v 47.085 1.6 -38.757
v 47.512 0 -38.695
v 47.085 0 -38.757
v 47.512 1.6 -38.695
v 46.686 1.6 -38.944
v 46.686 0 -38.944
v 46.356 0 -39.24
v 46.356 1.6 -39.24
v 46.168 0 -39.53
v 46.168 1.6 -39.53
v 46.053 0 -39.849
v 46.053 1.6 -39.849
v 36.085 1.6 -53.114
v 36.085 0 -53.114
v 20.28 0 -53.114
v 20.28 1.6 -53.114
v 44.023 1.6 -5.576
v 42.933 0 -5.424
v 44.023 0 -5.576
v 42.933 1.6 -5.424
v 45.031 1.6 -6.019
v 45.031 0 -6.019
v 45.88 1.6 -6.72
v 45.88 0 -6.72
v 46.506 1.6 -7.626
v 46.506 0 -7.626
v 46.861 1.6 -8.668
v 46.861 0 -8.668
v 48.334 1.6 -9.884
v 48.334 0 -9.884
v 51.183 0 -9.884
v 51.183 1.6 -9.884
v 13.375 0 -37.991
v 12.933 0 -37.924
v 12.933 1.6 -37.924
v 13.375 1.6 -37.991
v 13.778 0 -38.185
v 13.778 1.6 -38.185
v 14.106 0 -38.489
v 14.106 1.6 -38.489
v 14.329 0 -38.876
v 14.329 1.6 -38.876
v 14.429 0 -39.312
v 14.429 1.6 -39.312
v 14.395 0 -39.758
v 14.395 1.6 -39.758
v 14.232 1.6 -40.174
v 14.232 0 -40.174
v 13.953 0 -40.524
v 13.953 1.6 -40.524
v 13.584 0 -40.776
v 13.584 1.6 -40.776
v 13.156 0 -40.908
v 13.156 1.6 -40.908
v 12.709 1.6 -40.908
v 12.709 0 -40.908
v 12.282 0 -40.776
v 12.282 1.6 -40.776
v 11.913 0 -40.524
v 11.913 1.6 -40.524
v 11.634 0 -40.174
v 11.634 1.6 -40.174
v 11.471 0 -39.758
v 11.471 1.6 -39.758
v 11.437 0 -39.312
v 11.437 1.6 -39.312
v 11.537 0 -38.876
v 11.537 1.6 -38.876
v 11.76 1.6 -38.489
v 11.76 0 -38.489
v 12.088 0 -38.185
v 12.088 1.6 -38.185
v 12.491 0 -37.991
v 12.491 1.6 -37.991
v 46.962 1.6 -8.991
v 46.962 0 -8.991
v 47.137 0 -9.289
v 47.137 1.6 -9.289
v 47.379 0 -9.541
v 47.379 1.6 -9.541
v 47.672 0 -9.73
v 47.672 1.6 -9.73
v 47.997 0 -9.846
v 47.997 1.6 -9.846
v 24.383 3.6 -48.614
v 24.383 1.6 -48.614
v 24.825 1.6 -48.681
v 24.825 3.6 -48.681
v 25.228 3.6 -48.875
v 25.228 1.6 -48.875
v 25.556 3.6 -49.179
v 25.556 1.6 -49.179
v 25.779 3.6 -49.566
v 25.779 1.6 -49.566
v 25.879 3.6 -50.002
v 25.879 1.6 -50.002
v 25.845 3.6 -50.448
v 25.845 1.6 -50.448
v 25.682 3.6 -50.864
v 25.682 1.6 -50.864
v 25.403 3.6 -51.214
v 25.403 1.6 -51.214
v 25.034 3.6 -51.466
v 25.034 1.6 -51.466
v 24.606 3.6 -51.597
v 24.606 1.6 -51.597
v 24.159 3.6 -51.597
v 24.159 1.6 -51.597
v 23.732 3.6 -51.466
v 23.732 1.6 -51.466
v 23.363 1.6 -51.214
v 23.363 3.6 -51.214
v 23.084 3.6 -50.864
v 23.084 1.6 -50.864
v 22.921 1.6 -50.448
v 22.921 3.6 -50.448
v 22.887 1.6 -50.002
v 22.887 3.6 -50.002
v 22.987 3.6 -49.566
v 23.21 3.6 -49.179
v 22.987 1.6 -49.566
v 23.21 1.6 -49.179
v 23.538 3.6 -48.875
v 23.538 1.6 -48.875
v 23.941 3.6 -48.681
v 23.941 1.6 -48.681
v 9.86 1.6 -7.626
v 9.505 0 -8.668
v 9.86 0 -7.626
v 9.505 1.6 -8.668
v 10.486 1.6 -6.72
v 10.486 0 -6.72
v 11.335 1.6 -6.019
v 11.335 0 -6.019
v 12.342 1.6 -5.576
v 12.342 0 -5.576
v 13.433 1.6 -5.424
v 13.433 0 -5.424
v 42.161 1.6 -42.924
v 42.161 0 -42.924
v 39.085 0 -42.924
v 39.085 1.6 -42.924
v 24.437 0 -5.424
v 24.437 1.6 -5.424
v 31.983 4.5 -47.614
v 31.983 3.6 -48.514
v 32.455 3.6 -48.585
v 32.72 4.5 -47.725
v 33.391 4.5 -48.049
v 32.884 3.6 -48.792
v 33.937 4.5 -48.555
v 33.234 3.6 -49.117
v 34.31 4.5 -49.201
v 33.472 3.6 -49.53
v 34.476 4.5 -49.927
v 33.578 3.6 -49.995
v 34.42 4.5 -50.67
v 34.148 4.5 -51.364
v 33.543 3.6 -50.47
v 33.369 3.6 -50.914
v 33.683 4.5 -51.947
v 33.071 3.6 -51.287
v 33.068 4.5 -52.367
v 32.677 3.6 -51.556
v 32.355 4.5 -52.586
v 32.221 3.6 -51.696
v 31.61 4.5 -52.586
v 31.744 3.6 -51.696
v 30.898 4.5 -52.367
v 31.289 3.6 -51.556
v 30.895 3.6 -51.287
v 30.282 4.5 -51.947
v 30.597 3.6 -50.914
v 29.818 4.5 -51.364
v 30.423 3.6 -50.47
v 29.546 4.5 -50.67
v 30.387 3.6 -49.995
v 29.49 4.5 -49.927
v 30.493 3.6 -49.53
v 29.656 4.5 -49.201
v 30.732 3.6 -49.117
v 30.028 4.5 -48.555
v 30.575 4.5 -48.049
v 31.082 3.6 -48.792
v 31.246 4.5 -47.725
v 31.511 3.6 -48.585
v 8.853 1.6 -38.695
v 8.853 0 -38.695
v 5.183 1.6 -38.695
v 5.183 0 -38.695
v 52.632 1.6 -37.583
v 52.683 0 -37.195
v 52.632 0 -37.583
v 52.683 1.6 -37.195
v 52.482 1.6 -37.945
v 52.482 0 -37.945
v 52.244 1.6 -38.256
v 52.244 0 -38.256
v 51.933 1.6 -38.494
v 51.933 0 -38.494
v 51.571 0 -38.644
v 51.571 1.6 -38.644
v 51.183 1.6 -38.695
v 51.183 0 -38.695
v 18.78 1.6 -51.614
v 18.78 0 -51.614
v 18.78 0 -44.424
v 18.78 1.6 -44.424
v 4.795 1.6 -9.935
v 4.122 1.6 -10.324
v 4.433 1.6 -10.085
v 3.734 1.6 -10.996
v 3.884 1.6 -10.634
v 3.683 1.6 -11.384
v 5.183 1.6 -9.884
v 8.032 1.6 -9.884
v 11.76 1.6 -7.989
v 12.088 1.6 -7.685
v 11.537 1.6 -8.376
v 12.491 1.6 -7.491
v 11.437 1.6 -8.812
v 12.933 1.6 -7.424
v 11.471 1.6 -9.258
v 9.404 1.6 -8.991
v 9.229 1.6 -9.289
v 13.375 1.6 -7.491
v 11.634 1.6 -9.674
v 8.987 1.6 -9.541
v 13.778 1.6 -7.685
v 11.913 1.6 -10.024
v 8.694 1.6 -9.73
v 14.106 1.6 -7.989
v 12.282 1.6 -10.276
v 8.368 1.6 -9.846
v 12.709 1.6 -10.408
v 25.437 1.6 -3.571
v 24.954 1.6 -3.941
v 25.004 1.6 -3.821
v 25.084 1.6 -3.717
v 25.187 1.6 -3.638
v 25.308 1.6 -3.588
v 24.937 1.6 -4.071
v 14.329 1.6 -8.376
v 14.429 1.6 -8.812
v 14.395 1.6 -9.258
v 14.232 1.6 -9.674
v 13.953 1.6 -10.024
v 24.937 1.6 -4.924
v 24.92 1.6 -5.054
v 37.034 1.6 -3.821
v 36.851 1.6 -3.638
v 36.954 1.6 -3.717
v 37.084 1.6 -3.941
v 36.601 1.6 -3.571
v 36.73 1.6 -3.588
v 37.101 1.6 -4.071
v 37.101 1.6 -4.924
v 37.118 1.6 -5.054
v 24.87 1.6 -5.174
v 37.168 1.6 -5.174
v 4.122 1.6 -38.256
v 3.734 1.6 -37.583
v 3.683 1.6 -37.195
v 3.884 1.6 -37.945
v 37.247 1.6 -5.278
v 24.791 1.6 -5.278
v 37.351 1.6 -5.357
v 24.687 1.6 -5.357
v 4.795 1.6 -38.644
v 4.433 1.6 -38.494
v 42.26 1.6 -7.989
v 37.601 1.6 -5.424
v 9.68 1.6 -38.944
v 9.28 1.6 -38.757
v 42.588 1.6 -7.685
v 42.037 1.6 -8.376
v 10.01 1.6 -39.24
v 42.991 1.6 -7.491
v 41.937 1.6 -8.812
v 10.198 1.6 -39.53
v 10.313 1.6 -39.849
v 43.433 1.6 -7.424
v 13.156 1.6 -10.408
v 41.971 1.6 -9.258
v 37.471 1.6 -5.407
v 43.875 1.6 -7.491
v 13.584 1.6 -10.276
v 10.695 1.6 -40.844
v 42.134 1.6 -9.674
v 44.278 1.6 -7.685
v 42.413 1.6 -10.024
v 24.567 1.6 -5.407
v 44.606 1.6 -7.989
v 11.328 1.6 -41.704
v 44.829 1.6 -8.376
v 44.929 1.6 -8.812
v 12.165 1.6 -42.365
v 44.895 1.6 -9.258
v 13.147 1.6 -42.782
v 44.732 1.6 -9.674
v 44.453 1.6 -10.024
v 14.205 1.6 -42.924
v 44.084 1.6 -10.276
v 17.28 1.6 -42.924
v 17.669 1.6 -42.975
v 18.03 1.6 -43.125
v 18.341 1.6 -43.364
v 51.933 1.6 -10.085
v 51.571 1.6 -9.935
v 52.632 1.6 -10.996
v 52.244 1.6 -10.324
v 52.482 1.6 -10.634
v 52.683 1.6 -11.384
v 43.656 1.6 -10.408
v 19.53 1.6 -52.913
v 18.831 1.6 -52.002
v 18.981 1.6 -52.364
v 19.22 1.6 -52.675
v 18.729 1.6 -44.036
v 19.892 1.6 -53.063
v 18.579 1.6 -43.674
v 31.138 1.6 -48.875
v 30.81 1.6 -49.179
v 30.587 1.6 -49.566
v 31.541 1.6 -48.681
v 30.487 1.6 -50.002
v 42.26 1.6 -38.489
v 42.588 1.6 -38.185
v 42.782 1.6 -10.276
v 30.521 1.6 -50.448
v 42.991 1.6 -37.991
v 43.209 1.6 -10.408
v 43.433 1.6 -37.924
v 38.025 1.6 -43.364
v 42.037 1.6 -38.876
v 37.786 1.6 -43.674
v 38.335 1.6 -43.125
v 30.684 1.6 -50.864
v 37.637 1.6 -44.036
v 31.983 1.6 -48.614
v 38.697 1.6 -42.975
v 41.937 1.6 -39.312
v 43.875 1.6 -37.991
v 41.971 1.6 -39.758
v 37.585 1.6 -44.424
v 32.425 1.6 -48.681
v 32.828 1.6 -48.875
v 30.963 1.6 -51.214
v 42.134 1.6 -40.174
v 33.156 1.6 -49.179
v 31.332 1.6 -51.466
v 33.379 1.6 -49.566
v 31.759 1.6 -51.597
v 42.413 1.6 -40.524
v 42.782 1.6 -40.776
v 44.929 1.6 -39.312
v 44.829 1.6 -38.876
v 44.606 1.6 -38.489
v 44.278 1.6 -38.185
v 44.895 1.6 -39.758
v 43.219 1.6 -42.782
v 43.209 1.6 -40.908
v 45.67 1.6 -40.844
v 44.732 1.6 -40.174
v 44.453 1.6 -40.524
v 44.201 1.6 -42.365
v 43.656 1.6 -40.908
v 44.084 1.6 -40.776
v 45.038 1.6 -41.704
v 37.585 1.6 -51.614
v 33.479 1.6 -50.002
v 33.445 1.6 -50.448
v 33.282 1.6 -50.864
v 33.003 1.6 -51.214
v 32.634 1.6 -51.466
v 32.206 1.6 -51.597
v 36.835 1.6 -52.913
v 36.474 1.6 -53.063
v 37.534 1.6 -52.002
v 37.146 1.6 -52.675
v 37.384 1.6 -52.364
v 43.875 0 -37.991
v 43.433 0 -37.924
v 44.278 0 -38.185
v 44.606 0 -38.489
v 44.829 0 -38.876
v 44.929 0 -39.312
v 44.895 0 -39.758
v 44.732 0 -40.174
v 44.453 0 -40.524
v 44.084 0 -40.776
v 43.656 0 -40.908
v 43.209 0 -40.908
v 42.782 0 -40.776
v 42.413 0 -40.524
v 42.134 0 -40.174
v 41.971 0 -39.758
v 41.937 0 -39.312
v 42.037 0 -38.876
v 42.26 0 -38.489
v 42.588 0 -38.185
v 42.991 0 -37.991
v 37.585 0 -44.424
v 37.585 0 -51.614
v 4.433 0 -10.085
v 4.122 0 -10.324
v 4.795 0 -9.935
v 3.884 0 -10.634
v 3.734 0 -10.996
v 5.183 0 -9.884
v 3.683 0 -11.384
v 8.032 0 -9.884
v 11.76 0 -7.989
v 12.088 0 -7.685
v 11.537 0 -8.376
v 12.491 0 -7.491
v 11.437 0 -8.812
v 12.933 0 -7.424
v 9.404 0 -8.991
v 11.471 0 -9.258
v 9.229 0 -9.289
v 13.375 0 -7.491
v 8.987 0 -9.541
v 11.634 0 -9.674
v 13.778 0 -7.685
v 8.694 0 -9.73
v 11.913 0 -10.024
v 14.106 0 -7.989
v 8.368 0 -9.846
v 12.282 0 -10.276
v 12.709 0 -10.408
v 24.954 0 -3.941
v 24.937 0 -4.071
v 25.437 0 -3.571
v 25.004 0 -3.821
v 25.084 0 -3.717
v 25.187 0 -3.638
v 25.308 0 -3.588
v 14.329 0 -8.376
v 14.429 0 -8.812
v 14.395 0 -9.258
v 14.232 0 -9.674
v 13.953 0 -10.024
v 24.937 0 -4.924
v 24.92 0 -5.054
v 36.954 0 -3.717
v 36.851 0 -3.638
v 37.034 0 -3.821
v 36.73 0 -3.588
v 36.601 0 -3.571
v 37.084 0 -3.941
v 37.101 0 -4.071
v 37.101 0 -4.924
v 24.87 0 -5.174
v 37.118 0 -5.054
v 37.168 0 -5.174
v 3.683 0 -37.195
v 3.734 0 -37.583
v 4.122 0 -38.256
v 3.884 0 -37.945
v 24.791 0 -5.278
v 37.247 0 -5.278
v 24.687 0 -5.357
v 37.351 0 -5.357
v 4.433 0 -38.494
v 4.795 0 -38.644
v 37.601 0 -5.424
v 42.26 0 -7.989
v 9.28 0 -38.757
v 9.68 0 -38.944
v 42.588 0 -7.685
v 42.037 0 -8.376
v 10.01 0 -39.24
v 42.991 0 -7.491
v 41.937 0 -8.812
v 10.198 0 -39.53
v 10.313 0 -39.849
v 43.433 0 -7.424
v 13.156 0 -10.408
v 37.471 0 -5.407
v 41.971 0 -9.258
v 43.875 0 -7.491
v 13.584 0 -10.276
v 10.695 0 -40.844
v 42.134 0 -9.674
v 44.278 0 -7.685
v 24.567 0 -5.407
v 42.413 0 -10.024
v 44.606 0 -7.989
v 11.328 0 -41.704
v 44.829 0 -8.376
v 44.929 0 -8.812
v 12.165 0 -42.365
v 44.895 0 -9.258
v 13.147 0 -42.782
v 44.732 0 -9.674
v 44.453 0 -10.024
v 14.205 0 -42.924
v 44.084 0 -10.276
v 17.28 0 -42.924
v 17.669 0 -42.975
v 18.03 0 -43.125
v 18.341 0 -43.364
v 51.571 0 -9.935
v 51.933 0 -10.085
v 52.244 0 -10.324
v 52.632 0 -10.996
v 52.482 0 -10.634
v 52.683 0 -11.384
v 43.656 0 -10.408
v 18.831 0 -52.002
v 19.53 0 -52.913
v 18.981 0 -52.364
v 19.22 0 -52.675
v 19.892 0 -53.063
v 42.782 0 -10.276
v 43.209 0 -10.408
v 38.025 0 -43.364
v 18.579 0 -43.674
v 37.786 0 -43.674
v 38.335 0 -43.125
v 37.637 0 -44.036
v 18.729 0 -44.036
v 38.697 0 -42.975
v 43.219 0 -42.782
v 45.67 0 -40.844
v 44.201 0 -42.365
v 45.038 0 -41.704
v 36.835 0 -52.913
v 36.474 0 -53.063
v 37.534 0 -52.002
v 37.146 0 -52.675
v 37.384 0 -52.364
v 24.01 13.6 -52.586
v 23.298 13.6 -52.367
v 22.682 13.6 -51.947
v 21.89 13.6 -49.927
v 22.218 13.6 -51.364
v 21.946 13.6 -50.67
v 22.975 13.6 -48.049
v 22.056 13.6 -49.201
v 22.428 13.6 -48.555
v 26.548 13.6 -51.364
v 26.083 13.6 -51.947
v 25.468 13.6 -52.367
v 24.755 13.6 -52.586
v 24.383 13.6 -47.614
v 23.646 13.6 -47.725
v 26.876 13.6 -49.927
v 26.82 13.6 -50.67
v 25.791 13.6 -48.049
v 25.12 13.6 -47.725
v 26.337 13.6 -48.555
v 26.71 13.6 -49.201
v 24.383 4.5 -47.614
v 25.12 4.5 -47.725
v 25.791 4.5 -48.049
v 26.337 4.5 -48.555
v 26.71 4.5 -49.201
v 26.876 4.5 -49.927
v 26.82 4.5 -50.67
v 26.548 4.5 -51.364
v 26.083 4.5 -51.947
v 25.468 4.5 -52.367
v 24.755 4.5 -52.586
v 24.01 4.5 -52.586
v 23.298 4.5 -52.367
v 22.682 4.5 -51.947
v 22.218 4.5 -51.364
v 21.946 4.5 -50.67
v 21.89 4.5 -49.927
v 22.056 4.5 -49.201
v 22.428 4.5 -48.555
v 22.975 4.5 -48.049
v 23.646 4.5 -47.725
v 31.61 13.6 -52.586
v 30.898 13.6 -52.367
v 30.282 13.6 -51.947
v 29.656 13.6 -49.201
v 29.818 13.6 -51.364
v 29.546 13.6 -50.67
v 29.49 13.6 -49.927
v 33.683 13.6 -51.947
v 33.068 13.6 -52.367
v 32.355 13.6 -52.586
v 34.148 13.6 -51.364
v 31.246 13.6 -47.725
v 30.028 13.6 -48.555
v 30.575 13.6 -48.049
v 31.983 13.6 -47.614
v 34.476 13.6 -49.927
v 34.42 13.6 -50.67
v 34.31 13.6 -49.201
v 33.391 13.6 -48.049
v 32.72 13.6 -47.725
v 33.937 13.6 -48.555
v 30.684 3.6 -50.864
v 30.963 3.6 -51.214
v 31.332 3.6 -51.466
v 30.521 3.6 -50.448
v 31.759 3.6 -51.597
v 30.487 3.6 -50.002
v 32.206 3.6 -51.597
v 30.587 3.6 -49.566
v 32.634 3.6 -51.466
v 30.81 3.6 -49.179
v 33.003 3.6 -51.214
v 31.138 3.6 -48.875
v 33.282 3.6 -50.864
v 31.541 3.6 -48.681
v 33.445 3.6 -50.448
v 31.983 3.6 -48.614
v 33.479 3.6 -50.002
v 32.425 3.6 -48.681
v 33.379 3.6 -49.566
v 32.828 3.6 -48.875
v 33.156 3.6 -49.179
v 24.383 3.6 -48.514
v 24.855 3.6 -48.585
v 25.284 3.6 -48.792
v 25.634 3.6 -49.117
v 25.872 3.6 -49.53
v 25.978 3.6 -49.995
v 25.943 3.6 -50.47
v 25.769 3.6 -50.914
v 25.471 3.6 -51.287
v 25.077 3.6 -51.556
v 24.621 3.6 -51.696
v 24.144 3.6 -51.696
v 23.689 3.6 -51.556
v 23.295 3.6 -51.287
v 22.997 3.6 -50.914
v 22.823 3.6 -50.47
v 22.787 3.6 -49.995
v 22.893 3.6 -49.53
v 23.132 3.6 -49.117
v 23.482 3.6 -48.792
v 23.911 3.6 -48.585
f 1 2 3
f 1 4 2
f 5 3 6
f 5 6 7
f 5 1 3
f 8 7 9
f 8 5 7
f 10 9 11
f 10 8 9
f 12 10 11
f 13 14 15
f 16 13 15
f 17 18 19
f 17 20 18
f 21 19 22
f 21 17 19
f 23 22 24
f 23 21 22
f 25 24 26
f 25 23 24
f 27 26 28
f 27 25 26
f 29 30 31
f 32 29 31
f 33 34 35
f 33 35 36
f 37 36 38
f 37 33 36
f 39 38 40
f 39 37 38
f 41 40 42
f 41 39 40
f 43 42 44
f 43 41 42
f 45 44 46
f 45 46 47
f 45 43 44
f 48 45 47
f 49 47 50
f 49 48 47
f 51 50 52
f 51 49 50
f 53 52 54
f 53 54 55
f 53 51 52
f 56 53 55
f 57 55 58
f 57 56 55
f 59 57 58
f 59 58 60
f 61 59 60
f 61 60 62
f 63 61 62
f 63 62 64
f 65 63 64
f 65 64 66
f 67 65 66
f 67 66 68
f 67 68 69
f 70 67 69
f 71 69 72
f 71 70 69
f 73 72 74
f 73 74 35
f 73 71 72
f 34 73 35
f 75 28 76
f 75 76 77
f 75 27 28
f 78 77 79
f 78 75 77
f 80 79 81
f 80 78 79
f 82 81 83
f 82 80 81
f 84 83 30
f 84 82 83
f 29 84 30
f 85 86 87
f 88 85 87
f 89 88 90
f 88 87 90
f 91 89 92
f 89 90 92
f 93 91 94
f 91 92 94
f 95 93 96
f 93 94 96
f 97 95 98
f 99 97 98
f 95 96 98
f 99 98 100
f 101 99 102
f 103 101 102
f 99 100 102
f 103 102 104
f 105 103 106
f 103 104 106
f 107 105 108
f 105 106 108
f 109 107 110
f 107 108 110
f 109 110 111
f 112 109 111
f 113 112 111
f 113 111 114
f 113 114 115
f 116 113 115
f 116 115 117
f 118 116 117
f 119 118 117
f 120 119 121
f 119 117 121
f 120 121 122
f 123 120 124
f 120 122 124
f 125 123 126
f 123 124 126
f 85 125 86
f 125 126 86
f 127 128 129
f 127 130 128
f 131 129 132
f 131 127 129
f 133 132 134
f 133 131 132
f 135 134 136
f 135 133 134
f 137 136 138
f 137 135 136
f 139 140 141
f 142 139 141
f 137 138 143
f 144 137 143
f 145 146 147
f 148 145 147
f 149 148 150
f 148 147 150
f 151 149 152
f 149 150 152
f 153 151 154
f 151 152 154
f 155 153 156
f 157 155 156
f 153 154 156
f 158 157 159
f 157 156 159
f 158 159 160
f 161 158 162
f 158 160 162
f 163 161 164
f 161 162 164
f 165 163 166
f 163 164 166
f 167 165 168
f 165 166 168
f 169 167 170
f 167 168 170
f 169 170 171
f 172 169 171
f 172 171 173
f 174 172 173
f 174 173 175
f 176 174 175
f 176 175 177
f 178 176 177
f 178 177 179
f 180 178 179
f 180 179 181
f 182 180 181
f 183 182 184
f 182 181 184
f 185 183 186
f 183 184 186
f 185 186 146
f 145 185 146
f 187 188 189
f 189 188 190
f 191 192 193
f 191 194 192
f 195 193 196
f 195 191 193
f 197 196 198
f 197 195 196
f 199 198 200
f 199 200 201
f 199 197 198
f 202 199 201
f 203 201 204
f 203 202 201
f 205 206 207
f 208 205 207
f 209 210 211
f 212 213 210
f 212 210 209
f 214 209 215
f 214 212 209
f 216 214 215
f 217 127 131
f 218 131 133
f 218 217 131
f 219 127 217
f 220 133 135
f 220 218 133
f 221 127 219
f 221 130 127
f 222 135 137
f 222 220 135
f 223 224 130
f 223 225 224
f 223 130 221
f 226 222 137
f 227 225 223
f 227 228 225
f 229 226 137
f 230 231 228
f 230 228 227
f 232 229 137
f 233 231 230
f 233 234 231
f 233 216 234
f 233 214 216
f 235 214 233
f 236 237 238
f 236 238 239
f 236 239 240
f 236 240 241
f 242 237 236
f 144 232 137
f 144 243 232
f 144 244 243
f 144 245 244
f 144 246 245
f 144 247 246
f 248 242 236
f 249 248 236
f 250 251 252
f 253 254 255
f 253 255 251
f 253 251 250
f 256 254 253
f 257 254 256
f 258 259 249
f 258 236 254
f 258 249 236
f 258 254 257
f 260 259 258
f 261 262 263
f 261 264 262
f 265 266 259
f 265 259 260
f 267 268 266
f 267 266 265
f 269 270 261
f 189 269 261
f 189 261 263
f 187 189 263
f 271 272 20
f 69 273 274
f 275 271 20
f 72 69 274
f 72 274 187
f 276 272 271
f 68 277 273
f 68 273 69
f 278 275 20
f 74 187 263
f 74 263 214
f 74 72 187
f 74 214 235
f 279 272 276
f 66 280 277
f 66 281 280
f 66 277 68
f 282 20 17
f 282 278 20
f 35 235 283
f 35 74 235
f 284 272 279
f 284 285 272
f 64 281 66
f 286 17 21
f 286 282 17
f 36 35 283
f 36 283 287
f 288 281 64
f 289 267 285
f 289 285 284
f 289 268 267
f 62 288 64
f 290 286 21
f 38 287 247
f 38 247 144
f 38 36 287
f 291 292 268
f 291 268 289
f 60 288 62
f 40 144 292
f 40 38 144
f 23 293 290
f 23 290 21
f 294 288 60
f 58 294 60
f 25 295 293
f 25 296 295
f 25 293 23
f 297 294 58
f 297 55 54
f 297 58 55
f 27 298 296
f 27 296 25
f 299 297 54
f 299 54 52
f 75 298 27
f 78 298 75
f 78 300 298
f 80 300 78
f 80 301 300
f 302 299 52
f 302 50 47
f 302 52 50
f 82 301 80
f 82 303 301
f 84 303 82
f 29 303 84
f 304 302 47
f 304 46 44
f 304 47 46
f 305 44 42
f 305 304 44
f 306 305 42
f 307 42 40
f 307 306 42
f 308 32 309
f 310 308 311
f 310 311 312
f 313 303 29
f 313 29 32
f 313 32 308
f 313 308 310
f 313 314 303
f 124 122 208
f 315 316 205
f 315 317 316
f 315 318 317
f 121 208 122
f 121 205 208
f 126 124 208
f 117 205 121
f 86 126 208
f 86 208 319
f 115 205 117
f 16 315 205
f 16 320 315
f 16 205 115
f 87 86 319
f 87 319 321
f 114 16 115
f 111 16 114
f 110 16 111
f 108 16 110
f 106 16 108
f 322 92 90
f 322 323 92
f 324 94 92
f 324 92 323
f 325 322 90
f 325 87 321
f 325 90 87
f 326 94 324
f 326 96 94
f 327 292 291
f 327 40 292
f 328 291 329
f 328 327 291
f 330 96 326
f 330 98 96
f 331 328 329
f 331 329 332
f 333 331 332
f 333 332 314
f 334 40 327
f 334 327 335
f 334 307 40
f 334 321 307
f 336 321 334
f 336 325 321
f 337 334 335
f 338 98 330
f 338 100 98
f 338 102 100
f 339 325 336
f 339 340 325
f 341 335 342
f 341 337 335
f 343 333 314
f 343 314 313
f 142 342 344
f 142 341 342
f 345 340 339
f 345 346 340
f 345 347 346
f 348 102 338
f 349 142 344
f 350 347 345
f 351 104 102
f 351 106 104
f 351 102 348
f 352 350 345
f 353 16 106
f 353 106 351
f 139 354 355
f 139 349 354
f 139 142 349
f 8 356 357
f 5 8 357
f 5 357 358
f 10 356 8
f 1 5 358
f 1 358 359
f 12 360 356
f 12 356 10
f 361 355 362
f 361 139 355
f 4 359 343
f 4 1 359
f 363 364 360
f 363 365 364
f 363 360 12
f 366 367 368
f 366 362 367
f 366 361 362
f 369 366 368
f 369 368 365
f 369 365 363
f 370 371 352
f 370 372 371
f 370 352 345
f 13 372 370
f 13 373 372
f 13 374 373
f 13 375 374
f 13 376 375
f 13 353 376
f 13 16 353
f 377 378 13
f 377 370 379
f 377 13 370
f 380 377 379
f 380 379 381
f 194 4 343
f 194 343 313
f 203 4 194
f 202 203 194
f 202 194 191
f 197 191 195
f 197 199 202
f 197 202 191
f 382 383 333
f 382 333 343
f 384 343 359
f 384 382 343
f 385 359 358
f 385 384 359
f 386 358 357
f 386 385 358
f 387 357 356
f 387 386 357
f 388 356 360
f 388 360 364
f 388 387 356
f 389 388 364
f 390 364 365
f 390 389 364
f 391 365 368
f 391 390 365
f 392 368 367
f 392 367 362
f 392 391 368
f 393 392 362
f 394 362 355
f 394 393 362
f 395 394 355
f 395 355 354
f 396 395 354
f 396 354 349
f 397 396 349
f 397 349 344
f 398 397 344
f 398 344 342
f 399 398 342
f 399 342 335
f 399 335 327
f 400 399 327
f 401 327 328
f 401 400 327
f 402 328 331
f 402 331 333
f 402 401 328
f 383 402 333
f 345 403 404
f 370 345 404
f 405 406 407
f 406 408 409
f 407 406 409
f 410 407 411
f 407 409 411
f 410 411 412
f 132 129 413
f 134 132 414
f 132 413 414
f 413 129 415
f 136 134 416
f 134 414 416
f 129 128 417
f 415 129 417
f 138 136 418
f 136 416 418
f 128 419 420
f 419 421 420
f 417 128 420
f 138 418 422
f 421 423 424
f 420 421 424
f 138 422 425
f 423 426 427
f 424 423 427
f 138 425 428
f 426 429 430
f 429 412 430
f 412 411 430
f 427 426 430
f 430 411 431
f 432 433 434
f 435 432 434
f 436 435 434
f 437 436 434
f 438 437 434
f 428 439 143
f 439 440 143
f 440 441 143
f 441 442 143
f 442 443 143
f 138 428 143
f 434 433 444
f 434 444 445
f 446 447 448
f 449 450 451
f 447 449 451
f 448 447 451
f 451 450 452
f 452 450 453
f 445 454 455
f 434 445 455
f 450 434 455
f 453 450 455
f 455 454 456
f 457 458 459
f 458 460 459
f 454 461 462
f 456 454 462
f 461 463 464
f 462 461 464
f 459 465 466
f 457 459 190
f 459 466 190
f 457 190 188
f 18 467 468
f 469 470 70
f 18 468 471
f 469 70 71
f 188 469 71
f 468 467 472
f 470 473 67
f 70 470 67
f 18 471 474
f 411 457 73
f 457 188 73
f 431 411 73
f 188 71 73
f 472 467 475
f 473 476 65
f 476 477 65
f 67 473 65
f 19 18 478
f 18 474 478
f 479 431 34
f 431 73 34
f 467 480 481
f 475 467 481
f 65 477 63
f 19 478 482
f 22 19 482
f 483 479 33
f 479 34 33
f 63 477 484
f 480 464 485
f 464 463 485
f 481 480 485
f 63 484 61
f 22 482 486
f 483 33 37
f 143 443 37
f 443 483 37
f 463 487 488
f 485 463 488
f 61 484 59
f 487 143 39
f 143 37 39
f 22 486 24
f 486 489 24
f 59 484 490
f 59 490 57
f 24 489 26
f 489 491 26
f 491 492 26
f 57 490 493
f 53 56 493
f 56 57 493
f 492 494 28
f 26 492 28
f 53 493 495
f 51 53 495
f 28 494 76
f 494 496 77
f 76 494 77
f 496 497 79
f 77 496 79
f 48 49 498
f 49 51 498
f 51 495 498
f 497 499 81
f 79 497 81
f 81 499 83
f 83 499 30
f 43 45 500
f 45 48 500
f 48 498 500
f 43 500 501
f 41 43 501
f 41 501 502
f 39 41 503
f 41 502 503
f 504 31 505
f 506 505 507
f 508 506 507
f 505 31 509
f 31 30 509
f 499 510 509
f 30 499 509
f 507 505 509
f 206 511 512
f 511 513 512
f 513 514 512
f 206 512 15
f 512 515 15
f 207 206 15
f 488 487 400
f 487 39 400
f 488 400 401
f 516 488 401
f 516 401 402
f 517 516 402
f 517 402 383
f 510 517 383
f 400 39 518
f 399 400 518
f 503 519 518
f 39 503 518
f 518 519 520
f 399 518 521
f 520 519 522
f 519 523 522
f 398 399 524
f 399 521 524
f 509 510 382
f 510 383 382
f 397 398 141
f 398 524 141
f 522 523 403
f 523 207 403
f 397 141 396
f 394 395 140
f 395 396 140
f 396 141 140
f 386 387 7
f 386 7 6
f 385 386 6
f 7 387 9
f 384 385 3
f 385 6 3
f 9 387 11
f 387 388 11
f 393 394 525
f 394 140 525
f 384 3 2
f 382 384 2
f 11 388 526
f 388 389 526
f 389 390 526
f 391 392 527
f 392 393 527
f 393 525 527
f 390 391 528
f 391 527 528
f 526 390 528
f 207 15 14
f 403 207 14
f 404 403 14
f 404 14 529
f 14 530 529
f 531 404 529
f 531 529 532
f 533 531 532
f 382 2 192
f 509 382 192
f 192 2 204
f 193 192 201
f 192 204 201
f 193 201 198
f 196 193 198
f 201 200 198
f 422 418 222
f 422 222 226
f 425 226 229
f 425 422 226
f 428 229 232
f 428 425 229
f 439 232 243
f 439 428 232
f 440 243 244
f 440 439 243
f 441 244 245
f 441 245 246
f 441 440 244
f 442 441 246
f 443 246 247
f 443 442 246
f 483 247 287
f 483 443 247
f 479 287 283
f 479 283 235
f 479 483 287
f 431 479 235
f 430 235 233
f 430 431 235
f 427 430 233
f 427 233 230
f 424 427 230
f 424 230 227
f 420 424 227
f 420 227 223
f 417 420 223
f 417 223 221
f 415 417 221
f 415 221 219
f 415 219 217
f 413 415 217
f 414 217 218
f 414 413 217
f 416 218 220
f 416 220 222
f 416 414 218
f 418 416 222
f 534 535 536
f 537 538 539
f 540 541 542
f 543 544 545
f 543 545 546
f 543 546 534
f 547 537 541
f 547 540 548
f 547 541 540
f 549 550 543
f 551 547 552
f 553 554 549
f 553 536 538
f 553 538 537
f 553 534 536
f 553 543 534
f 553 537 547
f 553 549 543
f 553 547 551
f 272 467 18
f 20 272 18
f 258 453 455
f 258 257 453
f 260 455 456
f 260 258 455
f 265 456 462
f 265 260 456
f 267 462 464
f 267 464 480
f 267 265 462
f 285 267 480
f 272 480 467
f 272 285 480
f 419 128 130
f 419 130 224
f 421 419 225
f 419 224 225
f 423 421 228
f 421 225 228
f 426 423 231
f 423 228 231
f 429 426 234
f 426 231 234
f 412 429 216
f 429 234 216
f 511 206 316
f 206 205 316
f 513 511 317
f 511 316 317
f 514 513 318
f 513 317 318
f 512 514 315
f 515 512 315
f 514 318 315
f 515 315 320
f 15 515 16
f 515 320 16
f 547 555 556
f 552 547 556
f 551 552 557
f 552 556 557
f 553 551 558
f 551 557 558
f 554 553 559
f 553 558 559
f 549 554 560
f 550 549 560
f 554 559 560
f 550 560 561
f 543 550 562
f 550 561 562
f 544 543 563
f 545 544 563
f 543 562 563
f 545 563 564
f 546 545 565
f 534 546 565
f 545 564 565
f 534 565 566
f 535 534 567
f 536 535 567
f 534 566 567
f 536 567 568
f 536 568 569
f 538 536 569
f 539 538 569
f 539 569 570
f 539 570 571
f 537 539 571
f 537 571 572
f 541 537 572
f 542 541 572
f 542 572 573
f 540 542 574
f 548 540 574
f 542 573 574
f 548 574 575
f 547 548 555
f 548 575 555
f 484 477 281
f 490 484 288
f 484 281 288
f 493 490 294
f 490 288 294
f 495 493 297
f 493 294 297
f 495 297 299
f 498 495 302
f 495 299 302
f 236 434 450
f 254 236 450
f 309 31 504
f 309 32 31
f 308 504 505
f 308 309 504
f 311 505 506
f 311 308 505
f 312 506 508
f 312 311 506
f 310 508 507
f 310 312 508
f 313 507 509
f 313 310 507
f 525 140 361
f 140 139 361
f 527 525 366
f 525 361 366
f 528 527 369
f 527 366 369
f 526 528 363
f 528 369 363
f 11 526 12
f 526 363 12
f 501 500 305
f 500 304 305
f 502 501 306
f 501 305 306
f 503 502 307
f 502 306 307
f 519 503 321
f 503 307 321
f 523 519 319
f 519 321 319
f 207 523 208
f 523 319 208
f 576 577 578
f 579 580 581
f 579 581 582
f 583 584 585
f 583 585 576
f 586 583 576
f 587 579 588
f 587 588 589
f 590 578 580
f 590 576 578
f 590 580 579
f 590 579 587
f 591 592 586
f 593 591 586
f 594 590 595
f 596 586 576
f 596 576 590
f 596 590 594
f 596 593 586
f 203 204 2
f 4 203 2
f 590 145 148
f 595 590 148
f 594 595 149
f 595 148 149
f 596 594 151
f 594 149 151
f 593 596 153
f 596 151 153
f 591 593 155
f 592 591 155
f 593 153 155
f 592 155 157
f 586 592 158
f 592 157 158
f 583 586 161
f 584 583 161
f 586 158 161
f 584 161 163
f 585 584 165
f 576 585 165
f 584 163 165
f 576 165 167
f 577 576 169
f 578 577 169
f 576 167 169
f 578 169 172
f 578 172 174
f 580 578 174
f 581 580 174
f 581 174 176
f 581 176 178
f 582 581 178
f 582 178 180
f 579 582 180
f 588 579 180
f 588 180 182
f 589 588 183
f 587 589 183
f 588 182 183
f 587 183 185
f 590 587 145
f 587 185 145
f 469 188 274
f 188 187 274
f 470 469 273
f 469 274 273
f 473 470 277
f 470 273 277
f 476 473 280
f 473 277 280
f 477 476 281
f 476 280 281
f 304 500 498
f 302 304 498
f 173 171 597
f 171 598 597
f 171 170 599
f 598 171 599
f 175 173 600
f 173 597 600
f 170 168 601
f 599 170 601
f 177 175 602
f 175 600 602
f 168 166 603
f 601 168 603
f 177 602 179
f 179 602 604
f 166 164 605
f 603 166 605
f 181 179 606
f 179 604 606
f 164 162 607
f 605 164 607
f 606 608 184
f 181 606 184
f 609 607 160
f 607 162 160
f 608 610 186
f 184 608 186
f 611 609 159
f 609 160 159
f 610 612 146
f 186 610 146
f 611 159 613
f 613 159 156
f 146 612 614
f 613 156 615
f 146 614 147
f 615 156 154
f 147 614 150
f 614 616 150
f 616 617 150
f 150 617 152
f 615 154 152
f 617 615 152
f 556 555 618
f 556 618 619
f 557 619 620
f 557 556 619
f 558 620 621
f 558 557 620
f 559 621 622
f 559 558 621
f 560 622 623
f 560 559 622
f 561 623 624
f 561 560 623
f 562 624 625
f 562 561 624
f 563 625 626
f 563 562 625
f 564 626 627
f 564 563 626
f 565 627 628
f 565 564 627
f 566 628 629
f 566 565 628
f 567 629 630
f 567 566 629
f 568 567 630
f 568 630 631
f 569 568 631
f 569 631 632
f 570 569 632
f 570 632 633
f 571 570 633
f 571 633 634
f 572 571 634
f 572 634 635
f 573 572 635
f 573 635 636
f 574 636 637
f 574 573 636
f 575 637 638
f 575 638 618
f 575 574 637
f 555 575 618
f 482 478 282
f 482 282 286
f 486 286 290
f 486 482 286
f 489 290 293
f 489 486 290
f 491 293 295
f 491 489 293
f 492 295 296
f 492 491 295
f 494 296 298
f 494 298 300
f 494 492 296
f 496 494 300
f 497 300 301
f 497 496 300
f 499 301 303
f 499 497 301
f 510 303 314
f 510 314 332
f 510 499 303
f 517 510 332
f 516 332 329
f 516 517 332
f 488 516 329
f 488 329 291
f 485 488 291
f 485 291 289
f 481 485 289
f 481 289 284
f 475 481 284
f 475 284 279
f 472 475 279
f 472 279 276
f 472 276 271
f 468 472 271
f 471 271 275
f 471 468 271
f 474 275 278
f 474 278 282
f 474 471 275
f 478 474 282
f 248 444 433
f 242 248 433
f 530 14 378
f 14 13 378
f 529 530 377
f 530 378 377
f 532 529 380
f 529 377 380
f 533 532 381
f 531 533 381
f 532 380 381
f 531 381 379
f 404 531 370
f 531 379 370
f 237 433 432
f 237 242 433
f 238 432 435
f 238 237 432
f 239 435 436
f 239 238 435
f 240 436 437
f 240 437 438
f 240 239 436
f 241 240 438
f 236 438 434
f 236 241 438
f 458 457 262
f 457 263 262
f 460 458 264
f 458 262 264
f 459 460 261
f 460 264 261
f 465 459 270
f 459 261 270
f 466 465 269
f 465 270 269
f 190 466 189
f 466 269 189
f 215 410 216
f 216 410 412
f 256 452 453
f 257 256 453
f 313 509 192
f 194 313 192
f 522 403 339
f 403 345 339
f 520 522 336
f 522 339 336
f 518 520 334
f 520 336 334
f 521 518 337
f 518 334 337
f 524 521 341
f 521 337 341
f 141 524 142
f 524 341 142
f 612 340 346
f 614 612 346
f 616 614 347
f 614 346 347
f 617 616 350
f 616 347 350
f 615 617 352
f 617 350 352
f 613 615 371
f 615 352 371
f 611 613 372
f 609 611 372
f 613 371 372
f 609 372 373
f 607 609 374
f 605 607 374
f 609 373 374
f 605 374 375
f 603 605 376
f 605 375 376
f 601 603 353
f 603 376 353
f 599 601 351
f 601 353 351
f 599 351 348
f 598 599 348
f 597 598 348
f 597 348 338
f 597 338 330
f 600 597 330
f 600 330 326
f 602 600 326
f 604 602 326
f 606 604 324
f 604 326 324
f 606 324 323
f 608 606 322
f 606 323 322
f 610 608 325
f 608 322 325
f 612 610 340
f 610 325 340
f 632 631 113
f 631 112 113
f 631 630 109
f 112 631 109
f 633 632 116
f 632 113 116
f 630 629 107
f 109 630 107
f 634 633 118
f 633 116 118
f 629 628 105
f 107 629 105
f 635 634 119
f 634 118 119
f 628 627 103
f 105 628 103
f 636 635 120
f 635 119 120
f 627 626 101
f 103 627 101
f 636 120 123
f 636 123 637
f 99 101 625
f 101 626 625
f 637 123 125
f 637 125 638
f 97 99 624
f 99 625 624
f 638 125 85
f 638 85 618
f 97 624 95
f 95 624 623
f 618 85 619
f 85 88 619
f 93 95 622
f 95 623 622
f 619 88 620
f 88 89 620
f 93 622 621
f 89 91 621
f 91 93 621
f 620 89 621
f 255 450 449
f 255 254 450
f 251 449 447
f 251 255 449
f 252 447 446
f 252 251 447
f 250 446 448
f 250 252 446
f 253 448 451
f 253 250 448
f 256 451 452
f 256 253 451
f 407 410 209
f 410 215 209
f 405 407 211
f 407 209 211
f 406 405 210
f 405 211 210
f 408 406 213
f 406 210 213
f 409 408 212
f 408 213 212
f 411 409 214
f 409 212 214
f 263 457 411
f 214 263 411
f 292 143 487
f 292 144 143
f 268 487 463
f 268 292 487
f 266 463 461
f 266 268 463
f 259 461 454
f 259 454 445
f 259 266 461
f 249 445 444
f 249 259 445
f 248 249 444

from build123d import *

# Parameters (mm, degrees)
SKETCH1_R           = 1.5
BOSS_EXTRUDE1_DEPTH = 1.6
FILLET1_R           = 4
FILLET2_R           = 1.5
FILLET3_R           = 0.5
SKETCH2_R           = 1.25
BOSS_EXTRUDE2_DEPTH = 1.5
SKETCH3_R           = 1.5
BOSS_EXTRUDE3_DEPTH = 2
SKETCH4_R           = 2.5
BOSS_EXTRUDE4_DEPTH = 10
CHAMFER1_SIZE       = 0.9


with BuildPart() as part:
    # Sketch1 → Boss-Extrude1 (new body)
    with BuildSketch(Plane(origin=(0, 0, 0), x_dir=(1, 0, 0), z_dir=(0, 1, 0))):
        Polygon((3.682892501, 9.884360961), (9.432892501, 9.884360961), (9.432892501, 5.424302162), (24.937092609, 5.424302162), (24.937092609, 3.570771232), (37.100889333, 3.570771232), (37.100889333, 5.424302162), (46.932892501, 5.424302162), (46.932892501, 9.884360961), (52.682892501, 9.884360961), (52.682892501, 38.695125613), (46.161283606, 38.695125613), (46.161283606, 42.924302162), (37.585453381, 42.924302162), (37.585453381, 53.114107514), (18.780331621, 53.114107514), (18.780331621, 42.924302162), (10.204501396, 42.924302162), (10.204501396, 38.695125613), (3.682892501, 38.695125613), align=None)
        with Locations(Location((12.932892501, 8.924302162, 0), (0, 0, 270))):
            Circle(SKETCH1_R, mode=Mode.SUBTRACT)
        with Locations(Location((43.432892501, 8.924302162, 0), (0, 0, 270))):
            Circle(SKETCH1_R, mode=Mode.SUBTRACT)
        with Locations(Location((43.432892501, 39.424302162, 0), (0, 0, 270))):
            Circle(SKETCH1_R, mode=Mode.SUBTRACT)
        with Locations(Location((12.932892501, 39.424302162, 0), (0, 0, 270))):
            Circle(SKETCH1_R, mode=Mode.SUBTRACT)
    extrude(amount=BOSS_EXTRUDE1_DEPTH)

    # Fillet1
    fillet1_edges = [part.edges().sort_by_distance(p)[0] for p in [
        (46.161283606, 0.8, -42.924302162),
        (46.932892501, 0.8, -5.424302162),
        (9.432892501, 0.8, -5.424302162),
        (10.204501396, 0.8, -42.924302162),
    ]]
    fillet(fillet1_edges, radius=FILLET1_R)

    # Fillet2
    fillet2_edges = [part.edges().sort_by_distance(p)[0] for p in [
        (52.682892501, 0.8, -9.884360961),
        (52.682892501, 0.8, -38.695125613),
        (37.585453381, 0.8, -42.924302162),
        (37.585453381, 0.8, -53.114107514),
        (18.780331621, 0.8, -53.114107514),
        (18.780331621, 0.8, -42.924302162),
        (3.682892501, 0.8, -38.695125613),
        (46.932892501, 0.8, -9.884360961),
        (9.432892501, 0.8, -9.884360961),
        (46.161283606, 0.8, -38.695125613),
        (10.204501396, 0.8, -38.695125613),
        (3.682892501, 0.8, -9.884360961),
    ]]
    fillet(fillet2_edges, radius=FILLET2_R)

    # Fillet3
    fillet3_edges = [part.edges().sort_by_distance(p)[0] for p in [
        (37.100889333, 0.8, -5.424302162),
        (37.100889333, 0.8, -3.570771232),
        (24.937092609, 0.8, -3.570771232),
        (24.937092609, 0.8, -5.424302162),
    ]]
    fillet(fillet3_edges, radius=FILLET3_R)

    # Sketch2 → Boss-Extrude2 (add)
    with BuildSketch(Plane(origin=(0, 1.6, 0), x_dir=(1, 0, 0), z_dir=(0, 1, 0))):
        with Locations(Location((31.982892501, 50.114107514, 0), (0, 0, 270))):
            Circle(SKETCH2_R)
        with Locations(Location((24.382892501, 50.114107514, 0), (0, 0, 90))):
            Circle(SKETCH2_R)
    extrude(amount=BOSS_EXTRUDE2_DEPTH)

    # Sketch3 → Boss-Extrude3 (add)
    with BuildSketch(Plane(origin=(0, 1.6, 0), x_dir=(1, 0, 0), z_dir=(0, 1, 0))):
        with Locations(Location((31.982892501, 50.114107514, 0), (0, 0, 270))):
            Circle(SKETCH3_R)
        with Locations(Location((24.382892501, 50.114107514, 0), (0, 0, 270))):
            Circle(SKETCH3_R)
    extrude(amount=BOSS_EXTRUDE3_DEPTH)

    # Sketch4 → Boss-Extrude4 (add)
    with BuildSketch(Plane(origin=(0, 3.6, 0), x_dir=(1, 0, 0), z_dir=(0, 1, 0))):
        with Locations(Location((31.982892501, 50.114107514, 0), (0, 0, 270))):
            Circle(SKETCH4_R)
        with Locations(Location((24.382892501, 50.114107514, 0), (0, 0, 270))):
            Circle(SKETCH4_R)
    extrude(amount=BOSS_EXTRUDE4_DEPTH)

    # Chamfer1
    chamfer1_edges = [part.edges().sort_by_distance(p)[0] for p in [
        (31.982892501, 3.6, -52.614107514),
        (24.382892501, 3.6, -52.614107514),
    ]]
    chamfer(chamfer1_edges, length=CHAMFER1_SIZE)


solid = part.part
